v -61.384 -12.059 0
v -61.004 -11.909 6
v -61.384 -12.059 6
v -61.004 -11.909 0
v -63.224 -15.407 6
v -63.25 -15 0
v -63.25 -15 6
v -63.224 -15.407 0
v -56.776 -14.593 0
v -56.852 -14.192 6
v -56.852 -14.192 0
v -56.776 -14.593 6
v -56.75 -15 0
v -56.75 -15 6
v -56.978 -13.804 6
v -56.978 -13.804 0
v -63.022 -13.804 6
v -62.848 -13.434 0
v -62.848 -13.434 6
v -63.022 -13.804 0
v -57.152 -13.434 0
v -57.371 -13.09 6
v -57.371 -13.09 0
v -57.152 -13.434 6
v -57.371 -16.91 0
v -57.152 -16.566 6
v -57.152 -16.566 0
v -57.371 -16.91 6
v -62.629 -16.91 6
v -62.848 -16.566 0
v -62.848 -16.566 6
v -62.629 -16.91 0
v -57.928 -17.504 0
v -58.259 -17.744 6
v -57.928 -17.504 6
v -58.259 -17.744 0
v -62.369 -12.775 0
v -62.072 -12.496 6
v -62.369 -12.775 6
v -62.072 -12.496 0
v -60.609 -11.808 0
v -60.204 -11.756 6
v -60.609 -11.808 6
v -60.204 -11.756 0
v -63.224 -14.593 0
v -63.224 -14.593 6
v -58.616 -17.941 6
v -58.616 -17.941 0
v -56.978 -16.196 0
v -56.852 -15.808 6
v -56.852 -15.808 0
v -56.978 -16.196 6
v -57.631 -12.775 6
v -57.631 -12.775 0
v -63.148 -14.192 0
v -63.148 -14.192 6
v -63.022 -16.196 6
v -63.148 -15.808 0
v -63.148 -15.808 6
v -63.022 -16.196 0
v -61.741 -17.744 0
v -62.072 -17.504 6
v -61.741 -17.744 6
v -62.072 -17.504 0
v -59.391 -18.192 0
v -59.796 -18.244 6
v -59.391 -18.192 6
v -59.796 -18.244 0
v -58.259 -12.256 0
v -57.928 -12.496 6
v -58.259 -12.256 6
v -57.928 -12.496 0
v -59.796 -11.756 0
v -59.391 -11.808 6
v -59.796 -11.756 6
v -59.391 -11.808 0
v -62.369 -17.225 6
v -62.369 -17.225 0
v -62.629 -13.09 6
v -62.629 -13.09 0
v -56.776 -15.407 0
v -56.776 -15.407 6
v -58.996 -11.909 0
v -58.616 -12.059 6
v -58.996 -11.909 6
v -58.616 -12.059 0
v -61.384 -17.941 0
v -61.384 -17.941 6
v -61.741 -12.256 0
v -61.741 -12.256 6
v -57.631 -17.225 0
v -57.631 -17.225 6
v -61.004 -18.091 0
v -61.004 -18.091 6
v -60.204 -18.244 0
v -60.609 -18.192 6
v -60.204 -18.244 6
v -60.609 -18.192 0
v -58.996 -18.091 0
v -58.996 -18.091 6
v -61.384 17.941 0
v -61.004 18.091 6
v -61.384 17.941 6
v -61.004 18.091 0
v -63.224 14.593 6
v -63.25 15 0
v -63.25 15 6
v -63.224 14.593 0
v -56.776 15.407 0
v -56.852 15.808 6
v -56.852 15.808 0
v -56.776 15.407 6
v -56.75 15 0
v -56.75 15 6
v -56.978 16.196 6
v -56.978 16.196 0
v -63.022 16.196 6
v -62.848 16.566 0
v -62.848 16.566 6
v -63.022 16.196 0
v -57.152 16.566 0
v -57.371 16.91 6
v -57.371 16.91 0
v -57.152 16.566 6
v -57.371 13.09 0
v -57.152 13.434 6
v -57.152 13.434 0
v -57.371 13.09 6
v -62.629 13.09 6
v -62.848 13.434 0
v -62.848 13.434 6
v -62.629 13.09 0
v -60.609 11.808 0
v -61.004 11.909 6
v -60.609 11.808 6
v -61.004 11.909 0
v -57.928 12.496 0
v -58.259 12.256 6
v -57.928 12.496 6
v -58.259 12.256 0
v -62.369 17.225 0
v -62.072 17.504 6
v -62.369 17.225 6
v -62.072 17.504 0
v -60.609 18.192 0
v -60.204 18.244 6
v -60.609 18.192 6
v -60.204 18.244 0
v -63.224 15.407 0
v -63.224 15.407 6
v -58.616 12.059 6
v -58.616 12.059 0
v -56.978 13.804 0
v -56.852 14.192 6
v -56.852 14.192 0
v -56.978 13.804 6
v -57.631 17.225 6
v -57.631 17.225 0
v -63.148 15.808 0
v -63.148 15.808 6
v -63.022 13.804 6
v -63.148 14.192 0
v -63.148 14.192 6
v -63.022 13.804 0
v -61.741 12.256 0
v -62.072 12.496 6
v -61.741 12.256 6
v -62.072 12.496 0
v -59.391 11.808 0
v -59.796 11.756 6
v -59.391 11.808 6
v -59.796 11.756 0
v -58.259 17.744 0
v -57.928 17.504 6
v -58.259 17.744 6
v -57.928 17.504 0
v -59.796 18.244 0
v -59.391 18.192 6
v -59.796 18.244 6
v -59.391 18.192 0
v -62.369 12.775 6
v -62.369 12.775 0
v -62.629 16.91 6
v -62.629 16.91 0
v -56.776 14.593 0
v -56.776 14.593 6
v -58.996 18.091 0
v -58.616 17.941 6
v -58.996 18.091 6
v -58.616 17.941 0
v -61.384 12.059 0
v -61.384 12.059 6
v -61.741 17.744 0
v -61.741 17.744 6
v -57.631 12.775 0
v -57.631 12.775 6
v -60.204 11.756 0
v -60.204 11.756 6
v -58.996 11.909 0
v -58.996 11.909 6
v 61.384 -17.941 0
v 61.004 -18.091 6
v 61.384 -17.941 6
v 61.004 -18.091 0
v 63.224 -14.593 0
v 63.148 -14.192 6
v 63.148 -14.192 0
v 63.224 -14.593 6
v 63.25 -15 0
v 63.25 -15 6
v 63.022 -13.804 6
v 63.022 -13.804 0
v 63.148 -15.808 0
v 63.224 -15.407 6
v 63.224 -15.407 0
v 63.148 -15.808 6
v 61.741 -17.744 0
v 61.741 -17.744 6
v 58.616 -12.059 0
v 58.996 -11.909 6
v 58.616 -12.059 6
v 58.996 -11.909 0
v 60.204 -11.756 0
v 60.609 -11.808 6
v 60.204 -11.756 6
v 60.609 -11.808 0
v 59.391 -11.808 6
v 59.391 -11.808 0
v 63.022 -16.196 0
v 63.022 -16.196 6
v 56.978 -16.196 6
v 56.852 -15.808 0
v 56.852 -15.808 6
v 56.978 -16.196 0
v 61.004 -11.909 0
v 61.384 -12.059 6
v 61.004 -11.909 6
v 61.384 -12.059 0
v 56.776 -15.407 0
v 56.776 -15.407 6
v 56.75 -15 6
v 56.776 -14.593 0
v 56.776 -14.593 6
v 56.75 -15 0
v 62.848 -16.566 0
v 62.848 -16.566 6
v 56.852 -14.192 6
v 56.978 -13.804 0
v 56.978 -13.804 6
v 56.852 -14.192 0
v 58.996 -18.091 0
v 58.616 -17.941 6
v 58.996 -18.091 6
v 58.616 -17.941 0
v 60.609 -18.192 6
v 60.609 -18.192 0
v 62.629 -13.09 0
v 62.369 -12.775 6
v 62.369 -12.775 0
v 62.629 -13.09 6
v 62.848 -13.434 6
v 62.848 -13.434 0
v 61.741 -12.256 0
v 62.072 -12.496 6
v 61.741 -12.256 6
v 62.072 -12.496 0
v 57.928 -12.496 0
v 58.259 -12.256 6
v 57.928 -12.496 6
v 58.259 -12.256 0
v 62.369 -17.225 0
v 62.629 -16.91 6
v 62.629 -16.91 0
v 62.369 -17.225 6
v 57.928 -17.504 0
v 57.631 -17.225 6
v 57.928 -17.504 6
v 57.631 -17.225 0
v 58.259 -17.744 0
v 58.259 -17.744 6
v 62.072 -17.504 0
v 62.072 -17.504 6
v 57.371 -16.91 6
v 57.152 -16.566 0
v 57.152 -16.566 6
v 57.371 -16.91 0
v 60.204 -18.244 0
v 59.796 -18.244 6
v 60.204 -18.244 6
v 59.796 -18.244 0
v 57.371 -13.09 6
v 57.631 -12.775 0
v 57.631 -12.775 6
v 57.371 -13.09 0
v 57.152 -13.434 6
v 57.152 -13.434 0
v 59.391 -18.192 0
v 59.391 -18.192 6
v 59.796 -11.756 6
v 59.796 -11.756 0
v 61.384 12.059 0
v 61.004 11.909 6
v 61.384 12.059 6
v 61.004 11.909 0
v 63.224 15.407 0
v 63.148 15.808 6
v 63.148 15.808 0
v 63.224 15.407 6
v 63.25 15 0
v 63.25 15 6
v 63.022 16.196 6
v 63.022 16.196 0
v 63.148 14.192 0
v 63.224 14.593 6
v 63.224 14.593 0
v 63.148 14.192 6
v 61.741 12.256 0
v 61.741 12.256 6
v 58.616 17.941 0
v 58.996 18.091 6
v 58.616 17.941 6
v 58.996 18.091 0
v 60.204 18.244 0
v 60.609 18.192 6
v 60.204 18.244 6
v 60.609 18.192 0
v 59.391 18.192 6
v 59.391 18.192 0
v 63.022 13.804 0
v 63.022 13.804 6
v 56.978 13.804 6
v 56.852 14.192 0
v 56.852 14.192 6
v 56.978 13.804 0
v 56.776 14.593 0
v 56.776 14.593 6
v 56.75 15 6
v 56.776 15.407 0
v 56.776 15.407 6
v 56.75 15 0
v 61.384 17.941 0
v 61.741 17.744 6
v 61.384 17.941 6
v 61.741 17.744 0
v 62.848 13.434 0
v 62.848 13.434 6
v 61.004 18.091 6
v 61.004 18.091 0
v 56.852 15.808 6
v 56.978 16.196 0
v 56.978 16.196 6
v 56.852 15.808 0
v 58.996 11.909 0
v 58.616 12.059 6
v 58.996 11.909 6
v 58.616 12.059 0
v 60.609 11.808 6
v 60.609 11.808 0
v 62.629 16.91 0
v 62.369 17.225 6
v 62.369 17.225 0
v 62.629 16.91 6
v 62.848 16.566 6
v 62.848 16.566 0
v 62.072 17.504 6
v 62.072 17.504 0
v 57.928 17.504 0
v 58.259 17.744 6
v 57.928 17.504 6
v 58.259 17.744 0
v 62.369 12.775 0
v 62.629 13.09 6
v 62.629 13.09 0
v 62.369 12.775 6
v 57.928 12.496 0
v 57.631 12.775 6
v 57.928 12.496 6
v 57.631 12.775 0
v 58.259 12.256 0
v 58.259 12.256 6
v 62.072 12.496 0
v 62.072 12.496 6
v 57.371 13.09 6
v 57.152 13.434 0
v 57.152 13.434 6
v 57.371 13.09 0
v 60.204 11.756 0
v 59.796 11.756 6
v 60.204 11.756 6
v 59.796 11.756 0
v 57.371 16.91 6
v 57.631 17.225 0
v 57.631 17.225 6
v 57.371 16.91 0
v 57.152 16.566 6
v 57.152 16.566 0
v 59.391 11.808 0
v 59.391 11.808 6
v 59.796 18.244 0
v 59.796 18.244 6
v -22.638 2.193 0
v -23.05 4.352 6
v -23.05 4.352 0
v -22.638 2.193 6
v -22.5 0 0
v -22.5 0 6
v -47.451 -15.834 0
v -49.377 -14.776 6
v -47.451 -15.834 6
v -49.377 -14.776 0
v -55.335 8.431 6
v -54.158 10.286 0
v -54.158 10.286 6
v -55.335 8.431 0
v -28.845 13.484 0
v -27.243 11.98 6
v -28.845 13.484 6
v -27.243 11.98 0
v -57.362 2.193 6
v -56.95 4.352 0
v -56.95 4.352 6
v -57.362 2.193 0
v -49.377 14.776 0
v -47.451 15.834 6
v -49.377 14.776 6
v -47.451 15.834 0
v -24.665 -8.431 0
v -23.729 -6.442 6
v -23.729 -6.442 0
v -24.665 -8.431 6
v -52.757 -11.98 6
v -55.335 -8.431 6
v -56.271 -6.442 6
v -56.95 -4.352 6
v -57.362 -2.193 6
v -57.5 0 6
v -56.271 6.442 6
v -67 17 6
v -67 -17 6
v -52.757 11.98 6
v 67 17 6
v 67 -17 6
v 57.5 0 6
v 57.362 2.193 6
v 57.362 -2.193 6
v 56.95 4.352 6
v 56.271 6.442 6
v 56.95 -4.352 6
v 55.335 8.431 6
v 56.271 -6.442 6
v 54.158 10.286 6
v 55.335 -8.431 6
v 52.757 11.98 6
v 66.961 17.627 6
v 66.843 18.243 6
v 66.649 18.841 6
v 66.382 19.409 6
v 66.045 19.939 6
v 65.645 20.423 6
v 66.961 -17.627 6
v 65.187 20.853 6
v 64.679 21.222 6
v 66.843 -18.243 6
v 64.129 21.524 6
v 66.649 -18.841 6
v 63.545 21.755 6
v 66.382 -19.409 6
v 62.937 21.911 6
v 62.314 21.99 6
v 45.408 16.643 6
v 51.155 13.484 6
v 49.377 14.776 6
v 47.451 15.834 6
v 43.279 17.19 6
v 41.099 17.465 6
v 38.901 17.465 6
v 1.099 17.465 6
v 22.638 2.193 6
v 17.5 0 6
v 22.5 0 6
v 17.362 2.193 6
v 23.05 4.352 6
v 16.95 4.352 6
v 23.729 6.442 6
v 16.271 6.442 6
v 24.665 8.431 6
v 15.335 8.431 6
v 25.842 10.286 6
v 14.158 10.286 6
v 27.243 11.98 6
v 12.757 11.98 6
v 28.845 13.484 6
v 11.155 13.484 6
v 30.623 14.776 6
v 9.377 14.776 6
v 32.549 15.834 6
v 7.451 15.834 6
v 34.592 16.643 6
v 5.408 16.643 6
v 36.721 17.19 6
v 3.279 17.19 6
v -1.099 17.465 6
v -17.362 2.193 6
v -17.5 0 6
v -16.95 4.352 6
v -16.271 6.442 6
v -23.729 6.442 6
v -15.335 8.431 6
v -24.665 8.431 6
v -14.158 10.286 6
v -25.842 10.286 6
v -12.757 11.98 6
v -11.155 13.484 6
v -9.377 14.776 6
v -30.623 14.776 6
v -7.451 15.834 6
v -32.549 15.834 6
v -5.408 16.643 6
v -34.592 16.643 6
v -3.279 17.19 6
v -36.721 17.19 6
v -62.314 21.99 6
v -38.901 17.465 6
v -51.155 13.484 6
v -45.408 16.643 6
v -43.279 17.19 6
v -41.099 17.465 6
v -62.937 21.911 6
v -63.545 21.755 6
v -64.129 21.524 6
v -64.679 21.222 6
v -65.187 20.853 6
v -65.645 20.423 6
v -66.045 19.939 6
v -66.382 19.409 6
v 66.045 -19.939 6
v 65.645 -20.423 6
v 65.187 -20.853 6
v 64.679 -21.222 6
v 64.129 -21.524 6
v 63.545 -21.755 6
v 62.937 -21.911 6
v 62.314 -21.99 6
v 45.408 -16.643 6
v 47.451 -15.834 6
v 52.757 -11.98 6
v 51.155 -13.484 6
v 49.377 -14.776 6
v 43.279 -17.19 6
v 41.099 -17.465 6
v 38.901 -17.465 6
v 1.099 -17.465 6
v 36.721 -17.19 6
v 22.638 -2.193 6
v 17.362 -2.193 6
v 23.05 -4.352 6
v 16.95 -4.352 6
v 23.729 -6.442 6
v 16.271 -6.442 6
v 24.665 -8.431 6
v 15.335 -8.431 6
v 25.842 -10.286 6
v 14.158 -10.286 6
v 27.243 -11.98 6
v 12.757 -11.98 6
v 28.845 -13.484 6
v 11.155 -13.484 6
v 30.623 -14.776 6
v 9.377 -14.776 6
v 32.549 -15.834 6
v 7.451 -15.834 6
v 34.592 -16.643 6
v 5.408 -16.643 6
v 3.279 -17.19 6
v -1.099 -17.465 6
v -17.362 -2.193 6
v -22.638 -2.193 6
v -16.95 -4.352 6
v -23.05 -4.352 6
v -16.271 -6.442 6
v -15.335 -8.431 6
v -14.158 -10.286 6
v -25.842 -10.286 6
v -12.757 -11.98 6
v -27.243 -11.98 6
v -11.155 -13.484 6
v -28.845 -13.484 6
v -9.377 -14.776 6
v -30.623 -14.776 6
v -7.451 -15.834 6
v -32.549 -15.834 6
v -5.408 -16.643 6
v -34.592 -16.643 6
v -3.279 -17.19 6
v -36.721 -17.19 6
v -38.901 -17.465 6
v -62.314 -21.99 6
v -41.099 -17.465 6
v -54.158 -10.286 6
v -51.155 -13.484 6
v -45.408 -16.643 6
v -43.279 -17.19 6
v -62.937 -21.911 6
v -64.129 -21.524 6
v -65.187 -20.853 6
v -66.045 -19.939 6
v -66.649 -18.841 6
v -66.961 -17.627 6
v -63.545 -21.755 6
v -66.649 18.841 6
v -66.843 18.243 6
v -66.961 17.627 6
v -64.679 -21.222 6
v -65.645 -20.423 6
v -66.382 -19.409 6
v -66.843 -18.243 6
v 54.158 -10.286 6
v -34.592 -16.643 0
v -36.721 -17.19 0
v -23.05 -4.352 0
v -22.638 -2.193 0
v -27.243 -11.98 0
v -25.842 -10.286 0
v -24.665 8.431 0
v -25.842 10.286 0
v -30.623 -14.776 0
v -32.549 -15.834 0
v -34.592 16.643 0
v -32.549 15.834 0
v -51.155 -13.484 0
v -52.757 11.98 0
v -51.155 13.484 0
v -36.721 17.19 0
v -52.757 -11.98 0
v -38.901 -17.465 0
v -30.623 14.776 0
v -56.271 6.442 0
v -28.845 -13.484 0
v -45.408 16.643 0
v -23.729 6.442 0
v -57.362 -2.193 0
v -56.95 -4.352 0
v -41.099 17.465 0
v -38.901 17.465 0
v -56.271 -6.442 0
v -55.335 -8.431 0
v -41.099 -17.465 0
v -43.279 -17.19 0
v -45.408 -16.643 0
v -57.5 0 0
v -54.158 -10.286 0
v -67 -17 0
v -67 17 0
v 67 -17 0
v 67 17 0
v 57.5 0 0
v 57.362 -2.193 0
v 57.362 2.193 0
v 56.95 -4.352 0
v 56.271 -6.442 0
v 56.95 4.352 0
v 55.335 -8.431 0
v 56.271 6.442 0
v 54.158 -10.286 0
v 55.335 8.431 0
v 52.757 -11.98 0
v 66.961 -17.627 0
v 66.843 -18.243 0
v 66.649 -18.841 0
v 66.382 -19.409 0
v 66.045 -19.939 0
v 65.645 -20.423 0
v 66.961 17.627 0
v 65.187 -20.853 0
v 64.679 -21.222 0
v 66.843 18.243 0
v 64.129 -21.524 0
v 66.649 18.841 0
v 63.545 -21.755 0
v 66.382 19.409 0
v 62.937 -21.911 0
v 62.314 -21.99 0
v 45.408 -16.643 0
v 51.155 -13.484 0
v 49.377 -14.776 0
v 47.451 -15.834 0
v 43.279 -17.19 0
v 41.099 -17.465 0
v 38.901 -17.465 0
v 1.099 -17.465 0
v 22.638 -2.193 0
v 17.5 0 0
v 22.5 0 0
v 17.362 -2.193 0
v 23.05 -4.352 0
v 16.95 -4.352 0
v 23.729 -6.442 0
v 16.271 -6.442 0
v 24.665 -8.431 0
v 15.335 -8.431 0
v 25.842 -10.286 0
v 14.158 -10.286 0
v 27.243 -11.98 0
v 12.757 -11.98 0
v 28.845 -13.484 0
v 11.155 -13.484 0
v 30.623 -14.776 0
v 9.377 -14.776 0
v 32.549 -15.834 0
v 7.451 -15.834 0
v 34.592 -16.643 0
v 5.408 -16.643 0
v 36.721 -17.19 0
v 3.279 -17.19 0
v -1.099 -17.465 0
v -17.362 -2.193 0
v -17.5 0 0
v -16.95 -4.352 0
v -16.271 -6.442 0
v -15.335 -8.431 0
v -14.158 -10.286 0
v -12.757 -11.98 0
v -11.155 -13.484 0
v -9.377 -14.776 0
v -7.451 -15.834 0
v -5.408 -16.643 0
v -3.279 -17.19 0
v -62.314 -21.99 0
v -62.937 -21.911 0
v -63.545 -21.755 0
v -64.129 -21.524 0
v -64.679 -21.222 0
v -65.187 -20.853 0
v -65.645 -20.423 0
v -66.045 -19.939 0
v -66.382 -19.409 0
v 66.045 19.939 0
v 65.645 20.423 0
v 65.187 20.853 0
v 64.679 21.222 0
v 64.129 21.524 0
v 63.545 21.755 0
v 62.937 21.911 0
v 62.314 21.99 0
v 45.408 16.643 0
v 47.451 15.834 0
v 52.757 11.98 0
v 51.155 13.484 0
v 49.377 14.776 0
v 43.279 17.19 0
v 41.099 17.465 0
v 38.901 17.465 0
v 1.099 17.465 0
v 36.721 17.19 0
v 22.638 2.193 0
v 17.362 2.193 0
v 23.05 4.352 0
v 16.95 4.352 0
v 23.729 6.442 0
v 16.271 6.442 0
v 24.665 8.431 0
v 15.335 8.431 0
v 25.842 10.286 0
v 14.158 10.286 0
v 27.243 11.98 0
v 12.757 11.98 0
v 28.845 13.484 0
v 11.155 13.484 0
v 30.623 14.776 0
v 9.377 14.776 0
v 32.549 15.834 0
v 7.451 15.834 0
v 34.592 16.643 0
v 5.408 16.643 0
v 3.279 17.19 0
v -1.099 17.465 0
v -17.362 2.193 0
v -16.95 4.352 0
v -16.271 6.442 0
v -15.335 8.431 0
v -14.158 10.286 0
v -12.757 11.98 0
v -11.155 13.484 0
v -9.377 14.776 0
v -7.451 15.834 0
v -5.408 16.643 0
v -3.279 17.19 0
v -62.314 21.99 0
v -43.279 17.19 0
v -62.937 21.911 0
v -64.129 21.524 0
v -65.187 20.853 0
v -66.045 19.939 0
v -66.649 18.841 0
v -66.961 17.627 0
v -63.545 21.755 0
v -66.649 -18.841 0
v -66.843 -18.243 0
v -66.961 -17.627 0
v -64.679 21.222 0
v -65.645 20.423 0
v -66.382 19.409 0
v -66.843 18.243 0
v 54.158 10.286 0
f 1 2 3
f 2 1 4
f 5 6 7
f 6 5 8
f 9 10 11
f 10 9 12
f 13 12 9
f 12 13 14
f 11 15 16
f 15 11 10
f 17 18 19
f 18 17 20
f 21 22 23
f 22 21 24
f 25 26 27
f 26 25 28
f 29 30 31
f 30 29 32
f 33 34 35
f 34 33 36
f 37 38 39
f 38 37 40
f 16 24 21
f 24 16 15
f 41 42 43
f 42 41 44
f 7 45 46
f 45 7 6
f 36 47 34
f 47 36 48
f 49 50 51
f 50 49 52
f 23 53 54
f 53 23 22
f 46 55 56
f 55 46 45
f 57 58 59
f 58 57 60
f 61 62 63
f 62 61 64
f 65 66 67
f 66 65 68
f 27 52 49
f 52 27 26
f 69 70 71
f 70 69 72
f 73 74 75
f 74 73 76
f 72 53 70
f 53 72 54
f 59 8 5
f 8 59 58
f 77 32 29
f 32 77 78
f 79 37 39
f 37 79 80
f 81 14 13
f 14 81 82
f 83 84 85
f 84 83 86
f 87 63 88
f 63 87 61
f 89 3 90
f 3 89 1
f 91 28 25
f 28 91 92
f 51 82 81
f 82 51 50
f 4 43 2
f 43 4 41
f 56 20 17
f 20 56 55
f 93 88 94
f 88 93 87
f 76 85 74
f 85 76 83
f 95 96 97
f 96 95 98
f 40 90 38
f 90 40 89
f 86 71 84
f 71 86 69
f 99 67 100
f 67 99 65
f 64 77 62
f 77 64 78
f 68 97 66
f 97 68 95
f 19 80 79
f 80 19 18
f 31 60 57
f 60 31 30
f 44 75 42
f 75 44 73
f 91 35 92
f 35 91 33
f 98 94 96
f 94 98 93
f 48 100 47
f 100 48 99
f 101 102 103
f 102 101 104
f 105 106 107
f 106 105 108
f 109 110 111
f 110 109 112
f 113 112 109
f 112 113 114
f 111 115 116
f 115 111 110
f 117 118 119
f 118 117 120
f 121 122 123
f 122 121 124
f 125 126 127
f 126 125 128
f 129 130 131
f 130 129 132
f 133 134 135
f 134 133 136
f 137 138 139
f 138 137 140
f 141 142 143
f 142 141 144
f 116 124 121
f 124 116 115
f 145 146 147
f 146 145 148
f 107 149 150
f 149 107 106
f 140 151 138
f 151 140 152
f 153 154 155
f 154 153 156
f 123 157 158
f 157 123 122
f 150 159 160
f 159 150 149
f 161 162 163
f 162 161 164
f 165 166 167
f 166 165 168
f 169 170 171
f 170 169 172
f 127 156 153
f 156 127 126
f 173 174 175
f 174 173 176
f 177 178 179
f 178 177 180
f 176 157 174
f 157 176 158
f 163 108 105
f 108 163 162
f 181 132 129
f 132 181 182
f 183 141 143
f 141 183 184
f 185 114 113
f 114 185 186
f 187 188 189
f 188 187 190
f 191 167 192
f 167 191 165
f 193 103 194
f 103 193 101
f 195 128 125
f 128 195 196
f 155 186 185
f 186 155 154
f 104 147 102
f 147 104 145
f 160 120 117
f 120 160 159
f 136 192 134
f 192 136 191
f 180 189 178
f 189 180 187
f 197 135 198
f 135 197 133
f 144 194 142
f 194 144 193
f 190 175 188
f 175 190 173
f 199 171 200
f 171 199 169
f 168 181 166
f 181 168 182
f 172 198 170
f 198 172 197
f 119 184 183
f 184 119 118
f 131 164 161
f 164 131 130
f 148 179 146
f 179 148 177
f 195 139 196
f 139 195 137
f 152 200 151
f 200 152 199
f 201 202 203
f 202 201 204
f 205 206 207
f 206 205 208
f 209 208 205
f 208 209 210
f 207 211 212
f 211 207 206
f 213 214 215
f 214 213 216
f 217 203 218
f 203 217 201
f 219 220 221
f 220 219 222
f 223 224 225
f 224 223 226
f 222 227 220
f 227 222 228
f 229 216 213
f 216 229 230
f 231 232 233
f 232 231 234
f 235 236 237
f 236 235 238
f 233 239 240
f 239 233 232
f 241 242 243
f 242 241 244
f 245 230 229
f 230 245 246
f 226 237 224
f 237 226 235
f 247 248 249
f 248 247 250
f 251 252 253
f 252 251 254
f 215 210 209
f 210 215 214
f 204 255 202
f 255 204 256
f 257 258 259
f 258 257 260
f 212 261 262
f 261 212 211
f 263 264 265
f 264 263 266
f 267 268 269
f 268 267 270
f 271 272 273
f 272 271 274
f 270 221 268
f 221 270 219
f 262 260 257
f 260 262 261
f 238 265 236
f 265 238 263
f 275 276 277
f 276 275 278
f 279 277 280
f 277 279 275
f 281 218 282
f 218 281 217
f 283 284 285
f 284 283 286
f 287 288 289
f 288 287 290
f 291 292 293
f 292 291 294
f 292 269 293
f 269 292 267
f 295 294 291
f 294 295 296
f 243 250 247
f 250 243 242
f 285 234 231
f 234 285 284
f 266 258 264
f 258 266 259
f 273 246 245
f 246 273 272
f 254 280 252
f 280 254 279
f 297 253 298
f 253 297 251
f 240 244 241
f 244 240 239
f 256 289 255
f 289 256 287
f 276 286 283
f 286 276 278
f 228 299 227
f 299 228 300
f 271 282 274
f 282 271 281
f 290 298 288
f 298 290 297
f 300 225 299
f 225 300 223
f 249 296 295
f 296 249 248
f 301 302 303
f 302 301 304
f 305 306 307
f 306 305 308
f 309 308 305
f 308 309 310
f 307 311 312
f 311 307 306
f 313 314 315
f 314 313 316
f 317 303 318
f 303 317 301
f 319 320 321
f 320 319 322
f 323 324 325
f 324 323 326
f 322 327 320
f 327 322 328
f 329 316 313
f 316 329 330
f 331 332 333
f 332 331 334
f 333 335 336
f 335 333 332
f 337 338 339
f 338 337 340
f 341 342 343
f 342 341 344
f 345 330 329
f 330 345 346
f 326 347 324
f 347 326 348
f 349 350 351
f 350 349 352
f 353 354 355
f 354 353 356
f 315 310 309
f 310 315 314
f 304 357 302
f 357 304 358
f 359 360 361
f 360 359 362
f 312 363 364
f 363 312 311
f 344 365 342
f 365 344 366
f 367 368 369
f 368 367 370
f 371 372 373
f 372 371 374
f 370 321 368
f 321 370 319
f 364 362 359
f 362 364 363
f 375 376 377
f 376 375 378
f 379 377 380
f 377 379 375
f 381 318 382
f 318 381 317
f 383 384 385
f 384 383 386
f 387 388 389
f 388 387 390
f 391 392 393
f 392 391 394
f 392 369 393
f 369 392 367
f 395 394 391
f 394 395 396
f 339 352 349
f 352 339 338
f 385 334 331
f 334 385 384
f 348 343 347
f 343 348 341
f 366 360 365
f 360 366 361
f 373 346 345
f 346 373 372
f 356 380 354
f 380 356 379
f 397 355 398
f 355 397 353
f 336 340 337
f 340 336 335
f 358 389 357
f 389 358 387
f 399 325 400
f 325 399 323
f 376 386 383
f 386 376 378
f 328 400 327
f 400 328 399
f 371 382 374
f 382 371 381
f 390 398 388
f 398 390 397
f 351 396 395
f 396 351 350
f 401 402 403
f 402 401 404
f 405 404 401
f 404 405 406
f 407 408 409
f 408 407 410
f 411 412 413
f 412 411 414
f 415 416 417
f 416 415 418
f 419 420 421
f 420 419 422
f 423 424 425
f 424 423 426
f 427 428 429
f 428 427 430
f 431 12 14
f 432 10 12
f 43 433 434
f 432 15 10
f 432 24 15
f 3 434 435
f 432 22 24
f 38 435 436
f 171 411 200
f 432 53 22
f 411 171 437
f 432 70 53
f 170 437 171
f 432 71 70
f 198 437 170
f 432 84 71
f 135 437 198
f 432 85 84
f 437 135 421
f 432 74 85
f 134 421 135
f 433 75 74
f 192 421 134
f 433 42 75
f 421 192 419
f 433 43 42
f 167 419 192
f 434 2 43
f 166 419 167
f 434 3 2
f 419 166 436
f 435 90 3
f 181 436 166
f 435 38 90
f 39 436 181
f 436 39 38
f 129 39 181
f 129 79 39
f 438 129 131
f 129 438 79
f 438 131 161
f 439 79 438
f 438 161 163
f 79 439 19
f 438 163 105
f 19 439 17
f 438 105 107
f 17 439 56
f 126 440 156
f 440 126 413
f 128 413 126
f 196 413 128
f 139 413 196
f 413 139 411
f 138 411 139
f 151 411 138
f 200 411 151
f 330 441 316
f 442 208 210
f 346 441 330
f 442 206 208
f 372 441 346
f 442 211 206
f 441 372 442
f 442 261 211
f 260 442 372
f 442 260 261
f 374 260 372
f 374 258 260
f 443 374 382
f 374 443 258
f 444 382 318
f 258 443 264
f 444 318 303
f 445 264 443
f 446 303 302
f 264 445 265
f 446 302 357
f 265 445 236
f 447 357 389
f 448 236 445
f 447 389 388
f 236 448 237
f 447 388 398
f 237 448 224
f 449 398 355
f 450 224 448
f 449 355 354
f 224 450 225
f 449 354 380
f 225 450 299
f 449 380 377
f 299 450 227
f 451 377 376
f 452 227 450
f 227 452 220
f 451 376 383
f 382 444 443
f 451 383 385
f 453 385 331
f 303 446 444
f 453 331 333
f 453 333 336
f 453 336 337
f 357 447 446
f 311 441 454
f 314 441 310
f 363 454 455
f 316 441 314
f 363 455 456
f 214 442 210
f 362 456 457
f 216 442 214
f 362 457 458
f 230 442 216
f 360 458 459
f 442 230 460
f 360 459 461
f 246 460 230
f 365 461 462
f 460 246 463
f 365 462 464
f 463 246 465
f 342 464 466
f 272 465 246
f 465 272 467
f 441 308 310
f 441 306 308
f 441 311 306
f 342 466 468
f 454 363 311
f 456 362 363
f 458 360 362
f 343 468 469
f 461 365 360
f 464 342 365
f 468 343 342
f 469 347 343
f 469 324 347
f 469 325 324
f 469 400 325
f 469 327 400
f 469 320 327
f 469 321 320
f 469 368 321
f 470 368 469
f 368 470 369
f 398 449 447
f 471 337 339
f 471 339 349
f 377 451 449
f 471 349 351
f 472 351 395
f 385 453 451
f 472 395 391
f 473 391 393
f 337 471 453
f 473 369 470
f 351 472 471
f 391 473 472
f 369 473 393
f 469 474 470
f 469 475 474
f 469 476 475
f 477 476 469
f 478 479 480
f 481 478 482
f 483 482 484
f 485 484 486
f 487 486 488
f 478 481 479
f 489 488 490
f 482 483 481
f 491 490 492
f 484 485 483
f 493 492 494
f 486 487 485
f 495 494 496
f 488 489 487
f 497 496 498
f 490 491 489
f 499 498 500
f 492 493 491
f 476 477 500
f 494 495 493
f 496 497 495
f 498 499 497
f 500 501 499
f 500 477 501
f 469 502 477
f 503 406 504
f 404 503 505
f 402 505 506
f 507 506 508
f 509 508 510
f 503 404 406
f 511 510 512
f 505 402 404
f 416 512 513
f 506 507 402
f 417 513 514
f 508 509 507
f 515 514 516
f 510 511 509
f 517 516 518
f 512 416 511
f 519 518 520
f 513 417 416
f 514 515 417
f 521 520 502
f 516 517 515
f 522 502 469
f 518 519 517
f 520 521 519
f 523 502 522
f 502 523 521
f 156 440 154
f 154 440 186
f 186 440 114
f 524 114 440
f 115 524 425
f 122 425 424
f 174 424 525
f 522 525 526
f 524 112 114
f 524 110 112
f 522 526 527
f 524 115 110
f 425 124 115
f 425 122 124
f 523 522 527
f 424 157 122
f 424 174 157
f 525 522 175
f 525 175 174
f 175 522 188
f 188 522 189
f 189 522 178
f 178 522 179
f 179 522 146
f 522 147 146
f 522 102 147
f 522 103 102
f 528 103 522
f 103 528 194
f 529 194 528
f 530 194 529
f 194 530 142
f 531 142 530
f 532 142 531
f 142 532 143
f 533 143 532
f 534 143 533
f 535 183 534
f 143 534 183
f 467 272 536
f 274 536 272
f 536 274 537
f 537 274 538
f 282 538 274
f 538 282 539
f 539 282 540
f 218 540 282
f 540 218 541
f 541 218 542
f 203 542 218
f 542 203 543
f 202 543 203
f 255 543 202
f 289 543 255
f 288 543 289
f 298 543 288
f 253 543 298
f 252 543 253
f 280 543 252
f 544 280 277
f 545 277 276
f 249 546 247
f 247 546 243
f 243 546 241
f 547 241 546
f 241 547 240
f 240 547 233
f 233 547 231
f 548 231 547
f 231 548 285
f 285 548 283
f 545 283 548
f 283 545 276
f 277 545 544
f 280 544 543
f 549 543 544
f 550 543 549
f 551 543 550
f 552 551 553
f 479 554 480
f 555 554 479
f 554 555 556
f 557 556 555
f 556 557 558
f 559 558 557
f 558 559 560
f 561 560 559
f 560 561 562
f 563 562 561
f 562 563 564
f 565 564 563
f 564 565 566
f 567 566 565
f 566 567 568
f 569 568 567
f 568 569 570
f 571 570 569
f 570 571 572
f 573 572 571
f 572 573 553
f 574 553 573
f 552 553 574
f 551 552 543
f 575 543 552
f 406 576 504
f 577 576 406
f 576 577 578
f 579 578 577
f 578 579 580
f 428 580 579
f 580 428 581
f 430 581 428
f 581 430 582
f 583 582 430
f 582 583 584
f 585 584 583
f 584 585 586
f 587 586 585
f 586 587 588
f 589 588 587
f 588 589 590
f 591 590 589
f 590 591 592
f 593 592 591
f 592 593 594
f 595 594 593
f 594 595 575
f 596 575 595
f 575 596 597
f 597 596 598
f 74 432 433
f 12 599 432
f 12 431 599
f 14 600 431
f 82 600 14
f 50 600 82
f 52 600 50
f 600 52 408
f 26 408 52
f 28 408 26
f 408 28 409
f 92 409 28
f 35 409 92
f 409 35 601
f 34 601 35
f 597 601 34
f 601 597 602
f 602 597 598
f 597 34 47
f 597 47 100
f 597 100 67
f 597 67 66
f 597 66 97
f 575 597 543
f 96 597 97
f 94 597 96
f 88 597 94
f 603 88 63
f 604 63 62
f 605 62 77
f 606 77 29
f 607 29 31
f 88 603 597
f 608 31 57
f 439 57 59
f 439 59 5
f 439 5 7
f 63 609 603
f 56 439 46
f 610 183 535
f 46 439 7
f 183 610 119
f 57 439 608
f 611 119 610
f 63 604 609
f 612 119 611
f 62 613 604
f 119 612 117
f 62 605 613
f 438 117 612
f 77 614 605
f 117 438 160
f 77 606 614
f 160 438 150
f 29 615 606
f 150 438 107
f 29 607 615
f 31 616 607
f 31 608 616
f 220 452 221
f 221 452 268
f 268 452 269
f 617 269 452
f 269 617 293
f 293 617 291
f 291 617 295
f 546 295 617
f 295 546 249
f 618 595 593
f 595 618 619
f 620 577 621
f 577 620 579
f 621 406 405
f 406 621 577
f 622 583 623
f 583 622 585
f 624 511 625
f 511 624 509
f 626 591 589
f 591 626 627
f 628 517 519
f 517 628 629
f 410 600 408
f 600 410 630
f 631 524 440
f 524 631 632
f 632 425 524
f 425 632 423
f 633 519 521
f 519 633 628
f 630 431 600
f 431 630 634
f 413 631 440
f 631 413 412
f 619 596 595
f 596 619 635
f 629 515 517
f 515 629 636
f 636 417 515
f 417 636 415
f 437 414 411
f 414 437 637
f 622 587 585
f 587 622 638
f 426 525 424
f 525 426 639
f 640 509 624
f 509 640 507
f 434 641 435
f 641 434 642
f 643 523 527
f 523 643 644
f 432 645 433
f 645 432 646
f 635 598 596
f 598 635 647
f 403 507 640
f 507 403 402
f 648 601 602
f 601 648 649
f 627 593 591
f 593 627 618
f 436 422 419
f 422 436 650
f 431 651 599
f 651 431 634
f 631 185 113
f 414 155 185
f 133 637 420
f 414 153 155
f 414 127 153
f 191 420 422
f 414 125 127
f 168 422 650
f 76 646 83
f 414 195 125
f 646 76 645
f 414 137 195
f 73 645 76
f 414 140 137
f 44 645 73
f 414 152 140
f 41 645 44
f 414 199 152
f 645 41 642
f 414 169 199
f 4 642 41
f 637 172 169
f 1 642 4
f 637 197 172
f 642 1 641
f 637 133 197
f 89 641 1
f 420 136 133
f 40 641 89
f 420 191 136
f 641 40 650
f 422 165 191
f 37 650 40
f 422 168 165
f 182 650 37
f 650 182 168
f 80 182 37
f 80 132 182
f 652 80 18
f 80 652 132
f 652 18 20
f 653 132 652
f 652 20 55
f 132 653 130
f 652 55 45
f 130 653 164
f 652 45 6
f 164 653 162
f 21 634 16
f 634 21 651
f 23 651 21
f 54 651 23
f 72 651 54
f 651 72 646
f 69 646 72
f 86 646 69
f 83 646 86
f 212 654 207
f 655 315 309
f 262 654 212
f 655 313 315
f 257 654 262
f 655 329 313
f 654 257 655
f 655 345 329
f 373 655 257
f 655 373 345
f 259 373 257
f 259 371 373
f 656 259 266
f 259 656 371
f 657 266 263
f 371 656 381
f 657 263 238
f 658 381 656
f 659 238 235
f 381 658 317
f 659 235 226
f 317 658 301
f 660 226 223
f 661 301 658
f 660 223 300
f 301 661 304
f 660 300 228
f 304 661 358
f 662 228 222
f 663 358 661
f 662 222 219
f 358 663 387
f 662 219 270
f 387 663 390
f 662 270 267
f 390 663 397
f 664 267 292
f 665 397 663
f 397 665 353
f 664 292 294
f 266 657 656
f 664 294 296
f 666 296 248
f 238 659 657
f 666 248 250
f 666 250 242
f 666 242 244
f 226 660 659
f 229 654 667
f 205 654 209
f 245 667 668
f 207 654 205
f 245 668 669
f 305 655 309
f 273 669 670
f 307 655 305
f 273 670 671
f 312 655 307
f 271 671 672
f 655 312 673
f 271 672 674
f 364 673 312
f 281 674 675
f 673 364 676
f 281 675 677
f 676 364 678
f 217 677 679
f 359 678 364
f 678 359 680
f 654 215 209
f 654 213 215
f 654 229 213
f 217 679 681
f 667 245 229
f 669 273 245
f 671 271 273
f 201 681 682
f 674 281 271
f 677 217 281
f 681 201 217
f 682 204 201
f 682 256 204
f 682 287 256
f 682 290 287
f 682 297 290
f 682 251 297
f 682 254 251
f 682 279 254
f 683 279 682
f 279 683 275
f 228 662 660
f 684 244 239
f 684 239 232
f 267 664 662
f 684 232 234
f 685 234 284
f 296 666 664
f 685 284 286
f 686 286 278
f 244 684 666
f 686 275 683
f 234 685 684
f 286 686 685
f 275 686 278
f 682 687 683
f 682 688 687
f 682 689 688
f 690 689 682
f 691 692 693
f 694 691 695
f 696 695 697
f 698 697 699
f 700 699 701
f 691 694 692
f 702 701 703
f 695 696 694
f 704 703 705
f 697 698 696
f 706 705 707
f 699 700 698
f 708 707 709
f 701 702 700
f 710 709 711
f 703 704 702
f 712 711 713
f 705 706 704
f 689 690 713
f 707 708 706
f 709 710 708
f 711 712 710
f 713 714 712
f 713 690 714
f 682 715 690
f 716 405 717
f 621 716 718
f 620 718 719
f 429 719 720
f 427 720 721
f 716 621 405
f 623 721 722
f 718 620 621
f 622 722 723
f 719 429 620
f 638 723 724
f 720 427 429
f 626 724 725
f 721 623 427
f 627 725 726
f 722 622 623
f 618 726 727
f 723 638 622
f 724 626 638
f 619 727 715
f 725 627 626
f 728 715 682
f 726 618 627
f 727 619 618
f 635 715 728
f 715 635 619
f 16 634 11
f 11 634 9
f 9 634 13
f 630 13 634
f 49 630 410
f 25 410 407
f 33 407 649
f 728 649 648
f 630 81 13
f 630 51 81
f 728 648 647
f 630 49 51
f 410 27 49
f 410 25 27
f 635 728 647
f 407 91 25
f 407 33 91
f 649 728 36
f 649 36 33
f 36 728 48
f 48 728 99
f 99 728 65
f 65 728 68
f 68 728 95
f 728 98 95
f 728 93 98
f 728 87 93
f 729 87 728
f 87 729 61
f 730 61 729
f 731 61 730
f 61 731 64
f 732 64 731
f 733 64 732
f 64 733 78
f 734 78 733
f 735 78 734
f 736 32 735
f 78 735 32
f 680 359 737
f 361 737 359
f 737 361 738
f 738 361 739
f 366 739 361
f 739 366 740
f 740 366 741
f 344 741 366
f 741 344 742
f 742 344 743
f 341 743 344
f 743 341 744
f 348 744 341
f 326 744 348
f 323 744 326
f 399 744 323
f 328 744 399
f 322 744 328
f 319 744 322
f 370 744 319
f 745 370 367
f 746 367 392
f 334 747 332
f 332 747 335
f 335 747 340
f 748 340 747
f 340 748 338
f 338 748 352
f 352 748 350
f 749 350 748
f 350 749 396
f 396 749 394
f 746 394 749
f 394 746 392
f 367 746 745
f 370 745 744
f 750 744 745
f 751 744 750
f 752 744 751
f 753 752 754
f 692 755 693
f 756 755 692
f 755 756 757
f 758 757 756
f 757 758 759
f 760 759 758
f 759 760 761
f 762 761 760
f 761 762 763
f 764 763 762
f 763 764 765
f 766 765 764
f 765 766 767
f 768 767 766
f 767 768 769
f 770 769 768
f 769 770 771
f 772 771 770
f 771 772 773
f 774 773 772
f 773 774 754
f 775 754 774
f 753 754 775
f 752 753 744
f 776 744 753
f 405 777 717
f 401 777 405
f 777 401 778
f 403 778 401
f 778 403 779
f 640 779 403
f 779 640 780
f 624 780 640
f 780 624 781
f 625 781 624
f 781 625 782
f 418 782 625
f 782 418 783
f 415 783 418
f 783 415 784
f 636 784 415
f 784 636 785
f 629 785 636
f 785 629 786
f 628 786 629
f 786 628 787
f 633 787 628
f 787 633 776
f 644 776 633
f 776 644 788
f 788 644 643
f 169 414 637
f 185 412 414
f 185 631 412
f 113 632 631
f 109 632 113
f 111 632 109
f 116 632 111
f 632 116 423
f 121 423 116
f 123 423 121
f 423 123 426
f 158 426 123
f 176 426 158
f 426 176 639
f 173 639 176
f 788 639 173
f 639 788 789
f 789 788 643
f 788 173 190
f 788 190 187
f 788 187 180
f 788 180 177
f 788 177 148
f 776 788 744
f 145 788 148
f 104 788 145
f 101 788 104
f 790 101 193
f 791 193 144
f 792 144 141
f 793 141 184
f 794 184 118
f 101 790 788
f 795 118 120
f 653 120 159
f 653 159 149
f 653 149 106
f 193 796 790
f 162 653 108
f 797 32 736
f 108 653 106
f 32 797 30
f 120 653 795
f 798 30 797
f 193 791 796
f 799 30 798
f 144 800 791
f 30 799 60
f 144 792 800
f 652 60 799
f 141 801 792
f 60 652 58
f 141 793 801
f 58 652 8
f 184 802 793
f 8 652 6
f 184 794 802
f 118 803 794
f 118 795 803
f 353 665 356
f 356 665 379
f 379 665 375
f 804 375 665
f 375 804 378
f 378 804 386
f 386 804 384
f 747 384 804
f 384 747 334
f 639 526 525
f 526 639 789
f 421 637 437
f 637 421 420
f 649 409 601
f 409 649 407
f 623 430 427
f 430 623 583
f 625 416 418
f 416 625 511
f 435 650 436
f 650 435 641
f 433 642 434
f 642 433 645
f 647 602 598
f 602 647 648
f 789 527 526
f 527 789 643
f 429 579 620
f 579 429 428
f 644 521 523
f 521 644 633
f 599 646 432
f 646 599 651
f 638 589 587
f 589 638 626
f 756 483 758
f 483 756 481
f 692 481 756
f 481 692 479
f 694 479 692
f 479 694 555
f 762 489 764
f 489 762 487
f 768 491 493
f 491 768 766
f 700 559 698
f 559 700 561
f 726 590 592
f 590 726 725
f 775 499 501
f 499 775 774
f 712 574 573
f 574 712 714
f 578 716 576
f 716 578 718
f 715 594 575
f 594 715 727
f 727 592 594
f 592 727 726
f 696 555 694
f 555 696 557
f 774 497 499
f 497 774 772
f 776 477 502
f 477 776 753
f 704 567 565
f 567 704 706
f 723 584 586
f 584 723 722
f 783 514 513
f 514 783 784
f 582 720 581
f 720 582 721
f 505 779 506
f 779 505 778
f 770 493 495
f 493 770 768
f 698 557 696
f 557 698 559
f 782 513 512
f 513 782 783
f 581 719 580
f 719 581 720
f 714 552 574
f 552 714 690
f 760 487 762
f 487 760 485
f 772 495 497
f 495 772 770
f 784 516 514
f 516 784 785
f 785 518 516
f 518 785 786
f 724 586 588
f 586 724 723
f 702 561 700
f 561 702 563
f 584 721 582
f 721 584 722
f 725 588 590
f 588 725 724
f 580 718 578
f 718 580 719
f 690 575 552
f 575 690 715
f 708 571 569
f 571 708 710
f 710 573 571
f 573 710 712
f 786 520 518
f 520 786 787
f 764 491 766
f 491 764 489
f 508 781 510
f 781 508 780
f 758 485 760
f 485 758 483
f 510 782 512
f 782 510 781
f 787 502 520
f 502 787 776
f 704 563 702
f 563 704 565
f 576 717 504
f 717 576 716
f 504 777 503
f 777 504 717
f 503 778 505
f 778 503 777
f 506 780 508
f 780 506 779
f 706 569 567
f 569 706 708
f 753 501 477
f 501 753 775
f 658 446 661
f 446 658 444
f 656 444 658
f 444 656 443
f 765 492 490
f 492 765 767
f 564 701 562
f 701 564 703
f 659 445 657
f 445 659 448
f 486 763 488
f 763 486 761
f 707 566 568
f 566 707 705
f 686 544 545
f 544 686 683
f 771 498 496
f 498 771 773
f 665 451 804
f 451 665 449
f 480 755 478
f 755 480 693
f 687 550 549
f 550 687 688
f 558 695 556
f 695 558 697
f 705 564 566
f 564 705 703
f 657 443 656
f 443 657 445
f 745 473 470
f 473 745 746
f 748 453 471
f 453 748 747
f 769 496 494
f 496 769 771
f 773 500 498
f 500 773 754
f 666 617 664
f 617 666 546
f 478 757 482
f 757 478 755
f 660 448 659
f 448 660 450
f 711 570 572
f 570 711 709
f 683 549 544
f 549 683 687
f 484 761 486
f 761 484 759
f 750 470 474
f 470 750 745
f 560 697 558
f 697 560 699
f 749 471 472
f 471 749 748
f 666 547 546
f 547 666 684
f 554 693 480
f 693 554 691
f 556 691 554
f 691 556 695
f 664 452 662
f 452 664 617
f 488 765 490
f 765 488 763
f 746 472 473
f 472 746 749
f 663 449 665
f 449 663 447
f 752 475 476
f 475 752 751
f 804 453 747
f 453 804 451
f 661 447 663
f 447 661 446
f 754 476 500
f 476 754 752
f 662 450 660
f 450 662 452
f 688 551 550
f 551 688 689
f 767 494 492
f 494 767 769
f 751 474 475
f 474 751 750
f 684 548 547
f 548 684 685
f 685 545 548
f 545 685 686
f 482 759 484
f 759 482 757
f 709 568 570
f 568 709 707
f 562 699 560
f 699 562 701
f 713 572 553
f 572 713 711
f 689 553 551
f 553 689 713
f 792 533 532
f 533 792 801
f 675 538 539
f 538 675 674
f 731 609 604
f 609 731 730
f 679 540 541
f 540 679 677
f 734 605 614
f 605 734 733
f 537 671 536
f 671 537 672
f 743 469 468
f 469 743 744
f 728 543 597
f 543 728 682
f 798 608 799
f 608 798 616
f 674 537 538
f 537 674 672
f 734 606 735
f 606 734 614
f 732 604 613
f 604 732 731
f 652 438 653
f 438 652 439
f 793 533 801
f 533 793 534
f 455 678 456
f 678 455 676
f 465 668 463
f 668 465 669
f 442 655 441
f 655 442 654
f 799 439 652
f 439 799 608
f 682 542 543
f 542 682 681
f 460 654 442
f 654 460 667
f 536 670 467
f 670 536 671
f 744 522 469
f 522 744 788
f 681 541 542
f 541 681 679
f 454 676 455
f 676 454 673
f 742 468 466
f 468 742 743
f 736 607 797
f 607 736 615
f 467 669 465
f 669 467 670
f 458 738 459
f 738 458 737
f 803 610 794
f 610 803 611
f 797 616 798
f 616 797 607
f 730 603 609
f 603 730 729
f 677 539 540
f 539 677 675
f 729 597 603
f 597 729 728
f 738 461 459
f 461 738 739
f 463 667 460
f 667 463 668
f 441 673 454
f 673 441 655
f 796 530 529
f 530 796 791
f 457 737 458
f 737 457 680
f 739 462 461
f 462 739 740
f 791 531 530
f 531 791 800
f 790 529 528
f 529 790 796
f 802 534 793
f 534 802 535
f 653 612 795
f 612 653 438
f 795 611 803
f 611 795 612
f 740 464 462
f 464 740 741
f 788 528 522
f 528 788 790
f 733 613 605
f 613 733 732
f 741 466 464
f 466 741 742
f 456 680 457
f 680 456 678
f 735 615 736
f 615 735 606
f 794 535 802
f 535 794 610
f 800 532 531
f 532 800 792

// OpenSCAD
$fn = 50;

difference() {
	union() {
		hull() {
			translate(v = [-62.0, 17.0, 0]) {
				cylinder(h = 6, r = 5);
			}
			translate(v = [62.0, 17.0, 0]) {
				cylinder(h = 6, r = 5);
			}
			translate(v = [-62.0, -17.0, 0]) {
				cylinder(h = 6, r = 5);
			}
			translate(v = [62.0, -17.0, 0]) {
				cylinder(h = 6, r = 5);
			}
		}
	}
	union() {
		translate(v = [-60.0, -15.0, -100.0]) {
			cylinder(h = 200, r = 3.25);
		}
		translate(v = [-60.0, 15.0, -100.0]) {
			cylinder(h = 200, r = 3.25);
		}
		translate(v = [60.0, -15.0, -100.0]) {
			cylinder(h = 200, r = 3.25);
		}
		translate(v = [60.0, 15.0, -100.0]) {
			cylinder(h = 200, r = 3.25);
		}
		translate(v = [-60.0, -15.0, -100.0]) {
			cylinder(h = 200, r = 1.8);
		}
		translate(v = [-60.0, 15.0, -100.0]) {
			cylinder(h = 200, r = 1.8);
		}
		translate(v = [60.0, -15.0, -100.0]) {
			cylinder(h = 200, r = 1.8);
		}
		translate(v = [60.0, 15.0, -100.0]) {
			cylinder(h = 200, r = 1.8);
		}
		translate(v = [-40.0, 0, 0.0]) {
			cylinder(h = 6, r = 17.5);
		}
		cylinder(h = 6, r = 17.5);
		translate(v = [40.0, 0, 0.0]) {
			cylinder(h = 6, r = 17.5);
		}
	}
}
